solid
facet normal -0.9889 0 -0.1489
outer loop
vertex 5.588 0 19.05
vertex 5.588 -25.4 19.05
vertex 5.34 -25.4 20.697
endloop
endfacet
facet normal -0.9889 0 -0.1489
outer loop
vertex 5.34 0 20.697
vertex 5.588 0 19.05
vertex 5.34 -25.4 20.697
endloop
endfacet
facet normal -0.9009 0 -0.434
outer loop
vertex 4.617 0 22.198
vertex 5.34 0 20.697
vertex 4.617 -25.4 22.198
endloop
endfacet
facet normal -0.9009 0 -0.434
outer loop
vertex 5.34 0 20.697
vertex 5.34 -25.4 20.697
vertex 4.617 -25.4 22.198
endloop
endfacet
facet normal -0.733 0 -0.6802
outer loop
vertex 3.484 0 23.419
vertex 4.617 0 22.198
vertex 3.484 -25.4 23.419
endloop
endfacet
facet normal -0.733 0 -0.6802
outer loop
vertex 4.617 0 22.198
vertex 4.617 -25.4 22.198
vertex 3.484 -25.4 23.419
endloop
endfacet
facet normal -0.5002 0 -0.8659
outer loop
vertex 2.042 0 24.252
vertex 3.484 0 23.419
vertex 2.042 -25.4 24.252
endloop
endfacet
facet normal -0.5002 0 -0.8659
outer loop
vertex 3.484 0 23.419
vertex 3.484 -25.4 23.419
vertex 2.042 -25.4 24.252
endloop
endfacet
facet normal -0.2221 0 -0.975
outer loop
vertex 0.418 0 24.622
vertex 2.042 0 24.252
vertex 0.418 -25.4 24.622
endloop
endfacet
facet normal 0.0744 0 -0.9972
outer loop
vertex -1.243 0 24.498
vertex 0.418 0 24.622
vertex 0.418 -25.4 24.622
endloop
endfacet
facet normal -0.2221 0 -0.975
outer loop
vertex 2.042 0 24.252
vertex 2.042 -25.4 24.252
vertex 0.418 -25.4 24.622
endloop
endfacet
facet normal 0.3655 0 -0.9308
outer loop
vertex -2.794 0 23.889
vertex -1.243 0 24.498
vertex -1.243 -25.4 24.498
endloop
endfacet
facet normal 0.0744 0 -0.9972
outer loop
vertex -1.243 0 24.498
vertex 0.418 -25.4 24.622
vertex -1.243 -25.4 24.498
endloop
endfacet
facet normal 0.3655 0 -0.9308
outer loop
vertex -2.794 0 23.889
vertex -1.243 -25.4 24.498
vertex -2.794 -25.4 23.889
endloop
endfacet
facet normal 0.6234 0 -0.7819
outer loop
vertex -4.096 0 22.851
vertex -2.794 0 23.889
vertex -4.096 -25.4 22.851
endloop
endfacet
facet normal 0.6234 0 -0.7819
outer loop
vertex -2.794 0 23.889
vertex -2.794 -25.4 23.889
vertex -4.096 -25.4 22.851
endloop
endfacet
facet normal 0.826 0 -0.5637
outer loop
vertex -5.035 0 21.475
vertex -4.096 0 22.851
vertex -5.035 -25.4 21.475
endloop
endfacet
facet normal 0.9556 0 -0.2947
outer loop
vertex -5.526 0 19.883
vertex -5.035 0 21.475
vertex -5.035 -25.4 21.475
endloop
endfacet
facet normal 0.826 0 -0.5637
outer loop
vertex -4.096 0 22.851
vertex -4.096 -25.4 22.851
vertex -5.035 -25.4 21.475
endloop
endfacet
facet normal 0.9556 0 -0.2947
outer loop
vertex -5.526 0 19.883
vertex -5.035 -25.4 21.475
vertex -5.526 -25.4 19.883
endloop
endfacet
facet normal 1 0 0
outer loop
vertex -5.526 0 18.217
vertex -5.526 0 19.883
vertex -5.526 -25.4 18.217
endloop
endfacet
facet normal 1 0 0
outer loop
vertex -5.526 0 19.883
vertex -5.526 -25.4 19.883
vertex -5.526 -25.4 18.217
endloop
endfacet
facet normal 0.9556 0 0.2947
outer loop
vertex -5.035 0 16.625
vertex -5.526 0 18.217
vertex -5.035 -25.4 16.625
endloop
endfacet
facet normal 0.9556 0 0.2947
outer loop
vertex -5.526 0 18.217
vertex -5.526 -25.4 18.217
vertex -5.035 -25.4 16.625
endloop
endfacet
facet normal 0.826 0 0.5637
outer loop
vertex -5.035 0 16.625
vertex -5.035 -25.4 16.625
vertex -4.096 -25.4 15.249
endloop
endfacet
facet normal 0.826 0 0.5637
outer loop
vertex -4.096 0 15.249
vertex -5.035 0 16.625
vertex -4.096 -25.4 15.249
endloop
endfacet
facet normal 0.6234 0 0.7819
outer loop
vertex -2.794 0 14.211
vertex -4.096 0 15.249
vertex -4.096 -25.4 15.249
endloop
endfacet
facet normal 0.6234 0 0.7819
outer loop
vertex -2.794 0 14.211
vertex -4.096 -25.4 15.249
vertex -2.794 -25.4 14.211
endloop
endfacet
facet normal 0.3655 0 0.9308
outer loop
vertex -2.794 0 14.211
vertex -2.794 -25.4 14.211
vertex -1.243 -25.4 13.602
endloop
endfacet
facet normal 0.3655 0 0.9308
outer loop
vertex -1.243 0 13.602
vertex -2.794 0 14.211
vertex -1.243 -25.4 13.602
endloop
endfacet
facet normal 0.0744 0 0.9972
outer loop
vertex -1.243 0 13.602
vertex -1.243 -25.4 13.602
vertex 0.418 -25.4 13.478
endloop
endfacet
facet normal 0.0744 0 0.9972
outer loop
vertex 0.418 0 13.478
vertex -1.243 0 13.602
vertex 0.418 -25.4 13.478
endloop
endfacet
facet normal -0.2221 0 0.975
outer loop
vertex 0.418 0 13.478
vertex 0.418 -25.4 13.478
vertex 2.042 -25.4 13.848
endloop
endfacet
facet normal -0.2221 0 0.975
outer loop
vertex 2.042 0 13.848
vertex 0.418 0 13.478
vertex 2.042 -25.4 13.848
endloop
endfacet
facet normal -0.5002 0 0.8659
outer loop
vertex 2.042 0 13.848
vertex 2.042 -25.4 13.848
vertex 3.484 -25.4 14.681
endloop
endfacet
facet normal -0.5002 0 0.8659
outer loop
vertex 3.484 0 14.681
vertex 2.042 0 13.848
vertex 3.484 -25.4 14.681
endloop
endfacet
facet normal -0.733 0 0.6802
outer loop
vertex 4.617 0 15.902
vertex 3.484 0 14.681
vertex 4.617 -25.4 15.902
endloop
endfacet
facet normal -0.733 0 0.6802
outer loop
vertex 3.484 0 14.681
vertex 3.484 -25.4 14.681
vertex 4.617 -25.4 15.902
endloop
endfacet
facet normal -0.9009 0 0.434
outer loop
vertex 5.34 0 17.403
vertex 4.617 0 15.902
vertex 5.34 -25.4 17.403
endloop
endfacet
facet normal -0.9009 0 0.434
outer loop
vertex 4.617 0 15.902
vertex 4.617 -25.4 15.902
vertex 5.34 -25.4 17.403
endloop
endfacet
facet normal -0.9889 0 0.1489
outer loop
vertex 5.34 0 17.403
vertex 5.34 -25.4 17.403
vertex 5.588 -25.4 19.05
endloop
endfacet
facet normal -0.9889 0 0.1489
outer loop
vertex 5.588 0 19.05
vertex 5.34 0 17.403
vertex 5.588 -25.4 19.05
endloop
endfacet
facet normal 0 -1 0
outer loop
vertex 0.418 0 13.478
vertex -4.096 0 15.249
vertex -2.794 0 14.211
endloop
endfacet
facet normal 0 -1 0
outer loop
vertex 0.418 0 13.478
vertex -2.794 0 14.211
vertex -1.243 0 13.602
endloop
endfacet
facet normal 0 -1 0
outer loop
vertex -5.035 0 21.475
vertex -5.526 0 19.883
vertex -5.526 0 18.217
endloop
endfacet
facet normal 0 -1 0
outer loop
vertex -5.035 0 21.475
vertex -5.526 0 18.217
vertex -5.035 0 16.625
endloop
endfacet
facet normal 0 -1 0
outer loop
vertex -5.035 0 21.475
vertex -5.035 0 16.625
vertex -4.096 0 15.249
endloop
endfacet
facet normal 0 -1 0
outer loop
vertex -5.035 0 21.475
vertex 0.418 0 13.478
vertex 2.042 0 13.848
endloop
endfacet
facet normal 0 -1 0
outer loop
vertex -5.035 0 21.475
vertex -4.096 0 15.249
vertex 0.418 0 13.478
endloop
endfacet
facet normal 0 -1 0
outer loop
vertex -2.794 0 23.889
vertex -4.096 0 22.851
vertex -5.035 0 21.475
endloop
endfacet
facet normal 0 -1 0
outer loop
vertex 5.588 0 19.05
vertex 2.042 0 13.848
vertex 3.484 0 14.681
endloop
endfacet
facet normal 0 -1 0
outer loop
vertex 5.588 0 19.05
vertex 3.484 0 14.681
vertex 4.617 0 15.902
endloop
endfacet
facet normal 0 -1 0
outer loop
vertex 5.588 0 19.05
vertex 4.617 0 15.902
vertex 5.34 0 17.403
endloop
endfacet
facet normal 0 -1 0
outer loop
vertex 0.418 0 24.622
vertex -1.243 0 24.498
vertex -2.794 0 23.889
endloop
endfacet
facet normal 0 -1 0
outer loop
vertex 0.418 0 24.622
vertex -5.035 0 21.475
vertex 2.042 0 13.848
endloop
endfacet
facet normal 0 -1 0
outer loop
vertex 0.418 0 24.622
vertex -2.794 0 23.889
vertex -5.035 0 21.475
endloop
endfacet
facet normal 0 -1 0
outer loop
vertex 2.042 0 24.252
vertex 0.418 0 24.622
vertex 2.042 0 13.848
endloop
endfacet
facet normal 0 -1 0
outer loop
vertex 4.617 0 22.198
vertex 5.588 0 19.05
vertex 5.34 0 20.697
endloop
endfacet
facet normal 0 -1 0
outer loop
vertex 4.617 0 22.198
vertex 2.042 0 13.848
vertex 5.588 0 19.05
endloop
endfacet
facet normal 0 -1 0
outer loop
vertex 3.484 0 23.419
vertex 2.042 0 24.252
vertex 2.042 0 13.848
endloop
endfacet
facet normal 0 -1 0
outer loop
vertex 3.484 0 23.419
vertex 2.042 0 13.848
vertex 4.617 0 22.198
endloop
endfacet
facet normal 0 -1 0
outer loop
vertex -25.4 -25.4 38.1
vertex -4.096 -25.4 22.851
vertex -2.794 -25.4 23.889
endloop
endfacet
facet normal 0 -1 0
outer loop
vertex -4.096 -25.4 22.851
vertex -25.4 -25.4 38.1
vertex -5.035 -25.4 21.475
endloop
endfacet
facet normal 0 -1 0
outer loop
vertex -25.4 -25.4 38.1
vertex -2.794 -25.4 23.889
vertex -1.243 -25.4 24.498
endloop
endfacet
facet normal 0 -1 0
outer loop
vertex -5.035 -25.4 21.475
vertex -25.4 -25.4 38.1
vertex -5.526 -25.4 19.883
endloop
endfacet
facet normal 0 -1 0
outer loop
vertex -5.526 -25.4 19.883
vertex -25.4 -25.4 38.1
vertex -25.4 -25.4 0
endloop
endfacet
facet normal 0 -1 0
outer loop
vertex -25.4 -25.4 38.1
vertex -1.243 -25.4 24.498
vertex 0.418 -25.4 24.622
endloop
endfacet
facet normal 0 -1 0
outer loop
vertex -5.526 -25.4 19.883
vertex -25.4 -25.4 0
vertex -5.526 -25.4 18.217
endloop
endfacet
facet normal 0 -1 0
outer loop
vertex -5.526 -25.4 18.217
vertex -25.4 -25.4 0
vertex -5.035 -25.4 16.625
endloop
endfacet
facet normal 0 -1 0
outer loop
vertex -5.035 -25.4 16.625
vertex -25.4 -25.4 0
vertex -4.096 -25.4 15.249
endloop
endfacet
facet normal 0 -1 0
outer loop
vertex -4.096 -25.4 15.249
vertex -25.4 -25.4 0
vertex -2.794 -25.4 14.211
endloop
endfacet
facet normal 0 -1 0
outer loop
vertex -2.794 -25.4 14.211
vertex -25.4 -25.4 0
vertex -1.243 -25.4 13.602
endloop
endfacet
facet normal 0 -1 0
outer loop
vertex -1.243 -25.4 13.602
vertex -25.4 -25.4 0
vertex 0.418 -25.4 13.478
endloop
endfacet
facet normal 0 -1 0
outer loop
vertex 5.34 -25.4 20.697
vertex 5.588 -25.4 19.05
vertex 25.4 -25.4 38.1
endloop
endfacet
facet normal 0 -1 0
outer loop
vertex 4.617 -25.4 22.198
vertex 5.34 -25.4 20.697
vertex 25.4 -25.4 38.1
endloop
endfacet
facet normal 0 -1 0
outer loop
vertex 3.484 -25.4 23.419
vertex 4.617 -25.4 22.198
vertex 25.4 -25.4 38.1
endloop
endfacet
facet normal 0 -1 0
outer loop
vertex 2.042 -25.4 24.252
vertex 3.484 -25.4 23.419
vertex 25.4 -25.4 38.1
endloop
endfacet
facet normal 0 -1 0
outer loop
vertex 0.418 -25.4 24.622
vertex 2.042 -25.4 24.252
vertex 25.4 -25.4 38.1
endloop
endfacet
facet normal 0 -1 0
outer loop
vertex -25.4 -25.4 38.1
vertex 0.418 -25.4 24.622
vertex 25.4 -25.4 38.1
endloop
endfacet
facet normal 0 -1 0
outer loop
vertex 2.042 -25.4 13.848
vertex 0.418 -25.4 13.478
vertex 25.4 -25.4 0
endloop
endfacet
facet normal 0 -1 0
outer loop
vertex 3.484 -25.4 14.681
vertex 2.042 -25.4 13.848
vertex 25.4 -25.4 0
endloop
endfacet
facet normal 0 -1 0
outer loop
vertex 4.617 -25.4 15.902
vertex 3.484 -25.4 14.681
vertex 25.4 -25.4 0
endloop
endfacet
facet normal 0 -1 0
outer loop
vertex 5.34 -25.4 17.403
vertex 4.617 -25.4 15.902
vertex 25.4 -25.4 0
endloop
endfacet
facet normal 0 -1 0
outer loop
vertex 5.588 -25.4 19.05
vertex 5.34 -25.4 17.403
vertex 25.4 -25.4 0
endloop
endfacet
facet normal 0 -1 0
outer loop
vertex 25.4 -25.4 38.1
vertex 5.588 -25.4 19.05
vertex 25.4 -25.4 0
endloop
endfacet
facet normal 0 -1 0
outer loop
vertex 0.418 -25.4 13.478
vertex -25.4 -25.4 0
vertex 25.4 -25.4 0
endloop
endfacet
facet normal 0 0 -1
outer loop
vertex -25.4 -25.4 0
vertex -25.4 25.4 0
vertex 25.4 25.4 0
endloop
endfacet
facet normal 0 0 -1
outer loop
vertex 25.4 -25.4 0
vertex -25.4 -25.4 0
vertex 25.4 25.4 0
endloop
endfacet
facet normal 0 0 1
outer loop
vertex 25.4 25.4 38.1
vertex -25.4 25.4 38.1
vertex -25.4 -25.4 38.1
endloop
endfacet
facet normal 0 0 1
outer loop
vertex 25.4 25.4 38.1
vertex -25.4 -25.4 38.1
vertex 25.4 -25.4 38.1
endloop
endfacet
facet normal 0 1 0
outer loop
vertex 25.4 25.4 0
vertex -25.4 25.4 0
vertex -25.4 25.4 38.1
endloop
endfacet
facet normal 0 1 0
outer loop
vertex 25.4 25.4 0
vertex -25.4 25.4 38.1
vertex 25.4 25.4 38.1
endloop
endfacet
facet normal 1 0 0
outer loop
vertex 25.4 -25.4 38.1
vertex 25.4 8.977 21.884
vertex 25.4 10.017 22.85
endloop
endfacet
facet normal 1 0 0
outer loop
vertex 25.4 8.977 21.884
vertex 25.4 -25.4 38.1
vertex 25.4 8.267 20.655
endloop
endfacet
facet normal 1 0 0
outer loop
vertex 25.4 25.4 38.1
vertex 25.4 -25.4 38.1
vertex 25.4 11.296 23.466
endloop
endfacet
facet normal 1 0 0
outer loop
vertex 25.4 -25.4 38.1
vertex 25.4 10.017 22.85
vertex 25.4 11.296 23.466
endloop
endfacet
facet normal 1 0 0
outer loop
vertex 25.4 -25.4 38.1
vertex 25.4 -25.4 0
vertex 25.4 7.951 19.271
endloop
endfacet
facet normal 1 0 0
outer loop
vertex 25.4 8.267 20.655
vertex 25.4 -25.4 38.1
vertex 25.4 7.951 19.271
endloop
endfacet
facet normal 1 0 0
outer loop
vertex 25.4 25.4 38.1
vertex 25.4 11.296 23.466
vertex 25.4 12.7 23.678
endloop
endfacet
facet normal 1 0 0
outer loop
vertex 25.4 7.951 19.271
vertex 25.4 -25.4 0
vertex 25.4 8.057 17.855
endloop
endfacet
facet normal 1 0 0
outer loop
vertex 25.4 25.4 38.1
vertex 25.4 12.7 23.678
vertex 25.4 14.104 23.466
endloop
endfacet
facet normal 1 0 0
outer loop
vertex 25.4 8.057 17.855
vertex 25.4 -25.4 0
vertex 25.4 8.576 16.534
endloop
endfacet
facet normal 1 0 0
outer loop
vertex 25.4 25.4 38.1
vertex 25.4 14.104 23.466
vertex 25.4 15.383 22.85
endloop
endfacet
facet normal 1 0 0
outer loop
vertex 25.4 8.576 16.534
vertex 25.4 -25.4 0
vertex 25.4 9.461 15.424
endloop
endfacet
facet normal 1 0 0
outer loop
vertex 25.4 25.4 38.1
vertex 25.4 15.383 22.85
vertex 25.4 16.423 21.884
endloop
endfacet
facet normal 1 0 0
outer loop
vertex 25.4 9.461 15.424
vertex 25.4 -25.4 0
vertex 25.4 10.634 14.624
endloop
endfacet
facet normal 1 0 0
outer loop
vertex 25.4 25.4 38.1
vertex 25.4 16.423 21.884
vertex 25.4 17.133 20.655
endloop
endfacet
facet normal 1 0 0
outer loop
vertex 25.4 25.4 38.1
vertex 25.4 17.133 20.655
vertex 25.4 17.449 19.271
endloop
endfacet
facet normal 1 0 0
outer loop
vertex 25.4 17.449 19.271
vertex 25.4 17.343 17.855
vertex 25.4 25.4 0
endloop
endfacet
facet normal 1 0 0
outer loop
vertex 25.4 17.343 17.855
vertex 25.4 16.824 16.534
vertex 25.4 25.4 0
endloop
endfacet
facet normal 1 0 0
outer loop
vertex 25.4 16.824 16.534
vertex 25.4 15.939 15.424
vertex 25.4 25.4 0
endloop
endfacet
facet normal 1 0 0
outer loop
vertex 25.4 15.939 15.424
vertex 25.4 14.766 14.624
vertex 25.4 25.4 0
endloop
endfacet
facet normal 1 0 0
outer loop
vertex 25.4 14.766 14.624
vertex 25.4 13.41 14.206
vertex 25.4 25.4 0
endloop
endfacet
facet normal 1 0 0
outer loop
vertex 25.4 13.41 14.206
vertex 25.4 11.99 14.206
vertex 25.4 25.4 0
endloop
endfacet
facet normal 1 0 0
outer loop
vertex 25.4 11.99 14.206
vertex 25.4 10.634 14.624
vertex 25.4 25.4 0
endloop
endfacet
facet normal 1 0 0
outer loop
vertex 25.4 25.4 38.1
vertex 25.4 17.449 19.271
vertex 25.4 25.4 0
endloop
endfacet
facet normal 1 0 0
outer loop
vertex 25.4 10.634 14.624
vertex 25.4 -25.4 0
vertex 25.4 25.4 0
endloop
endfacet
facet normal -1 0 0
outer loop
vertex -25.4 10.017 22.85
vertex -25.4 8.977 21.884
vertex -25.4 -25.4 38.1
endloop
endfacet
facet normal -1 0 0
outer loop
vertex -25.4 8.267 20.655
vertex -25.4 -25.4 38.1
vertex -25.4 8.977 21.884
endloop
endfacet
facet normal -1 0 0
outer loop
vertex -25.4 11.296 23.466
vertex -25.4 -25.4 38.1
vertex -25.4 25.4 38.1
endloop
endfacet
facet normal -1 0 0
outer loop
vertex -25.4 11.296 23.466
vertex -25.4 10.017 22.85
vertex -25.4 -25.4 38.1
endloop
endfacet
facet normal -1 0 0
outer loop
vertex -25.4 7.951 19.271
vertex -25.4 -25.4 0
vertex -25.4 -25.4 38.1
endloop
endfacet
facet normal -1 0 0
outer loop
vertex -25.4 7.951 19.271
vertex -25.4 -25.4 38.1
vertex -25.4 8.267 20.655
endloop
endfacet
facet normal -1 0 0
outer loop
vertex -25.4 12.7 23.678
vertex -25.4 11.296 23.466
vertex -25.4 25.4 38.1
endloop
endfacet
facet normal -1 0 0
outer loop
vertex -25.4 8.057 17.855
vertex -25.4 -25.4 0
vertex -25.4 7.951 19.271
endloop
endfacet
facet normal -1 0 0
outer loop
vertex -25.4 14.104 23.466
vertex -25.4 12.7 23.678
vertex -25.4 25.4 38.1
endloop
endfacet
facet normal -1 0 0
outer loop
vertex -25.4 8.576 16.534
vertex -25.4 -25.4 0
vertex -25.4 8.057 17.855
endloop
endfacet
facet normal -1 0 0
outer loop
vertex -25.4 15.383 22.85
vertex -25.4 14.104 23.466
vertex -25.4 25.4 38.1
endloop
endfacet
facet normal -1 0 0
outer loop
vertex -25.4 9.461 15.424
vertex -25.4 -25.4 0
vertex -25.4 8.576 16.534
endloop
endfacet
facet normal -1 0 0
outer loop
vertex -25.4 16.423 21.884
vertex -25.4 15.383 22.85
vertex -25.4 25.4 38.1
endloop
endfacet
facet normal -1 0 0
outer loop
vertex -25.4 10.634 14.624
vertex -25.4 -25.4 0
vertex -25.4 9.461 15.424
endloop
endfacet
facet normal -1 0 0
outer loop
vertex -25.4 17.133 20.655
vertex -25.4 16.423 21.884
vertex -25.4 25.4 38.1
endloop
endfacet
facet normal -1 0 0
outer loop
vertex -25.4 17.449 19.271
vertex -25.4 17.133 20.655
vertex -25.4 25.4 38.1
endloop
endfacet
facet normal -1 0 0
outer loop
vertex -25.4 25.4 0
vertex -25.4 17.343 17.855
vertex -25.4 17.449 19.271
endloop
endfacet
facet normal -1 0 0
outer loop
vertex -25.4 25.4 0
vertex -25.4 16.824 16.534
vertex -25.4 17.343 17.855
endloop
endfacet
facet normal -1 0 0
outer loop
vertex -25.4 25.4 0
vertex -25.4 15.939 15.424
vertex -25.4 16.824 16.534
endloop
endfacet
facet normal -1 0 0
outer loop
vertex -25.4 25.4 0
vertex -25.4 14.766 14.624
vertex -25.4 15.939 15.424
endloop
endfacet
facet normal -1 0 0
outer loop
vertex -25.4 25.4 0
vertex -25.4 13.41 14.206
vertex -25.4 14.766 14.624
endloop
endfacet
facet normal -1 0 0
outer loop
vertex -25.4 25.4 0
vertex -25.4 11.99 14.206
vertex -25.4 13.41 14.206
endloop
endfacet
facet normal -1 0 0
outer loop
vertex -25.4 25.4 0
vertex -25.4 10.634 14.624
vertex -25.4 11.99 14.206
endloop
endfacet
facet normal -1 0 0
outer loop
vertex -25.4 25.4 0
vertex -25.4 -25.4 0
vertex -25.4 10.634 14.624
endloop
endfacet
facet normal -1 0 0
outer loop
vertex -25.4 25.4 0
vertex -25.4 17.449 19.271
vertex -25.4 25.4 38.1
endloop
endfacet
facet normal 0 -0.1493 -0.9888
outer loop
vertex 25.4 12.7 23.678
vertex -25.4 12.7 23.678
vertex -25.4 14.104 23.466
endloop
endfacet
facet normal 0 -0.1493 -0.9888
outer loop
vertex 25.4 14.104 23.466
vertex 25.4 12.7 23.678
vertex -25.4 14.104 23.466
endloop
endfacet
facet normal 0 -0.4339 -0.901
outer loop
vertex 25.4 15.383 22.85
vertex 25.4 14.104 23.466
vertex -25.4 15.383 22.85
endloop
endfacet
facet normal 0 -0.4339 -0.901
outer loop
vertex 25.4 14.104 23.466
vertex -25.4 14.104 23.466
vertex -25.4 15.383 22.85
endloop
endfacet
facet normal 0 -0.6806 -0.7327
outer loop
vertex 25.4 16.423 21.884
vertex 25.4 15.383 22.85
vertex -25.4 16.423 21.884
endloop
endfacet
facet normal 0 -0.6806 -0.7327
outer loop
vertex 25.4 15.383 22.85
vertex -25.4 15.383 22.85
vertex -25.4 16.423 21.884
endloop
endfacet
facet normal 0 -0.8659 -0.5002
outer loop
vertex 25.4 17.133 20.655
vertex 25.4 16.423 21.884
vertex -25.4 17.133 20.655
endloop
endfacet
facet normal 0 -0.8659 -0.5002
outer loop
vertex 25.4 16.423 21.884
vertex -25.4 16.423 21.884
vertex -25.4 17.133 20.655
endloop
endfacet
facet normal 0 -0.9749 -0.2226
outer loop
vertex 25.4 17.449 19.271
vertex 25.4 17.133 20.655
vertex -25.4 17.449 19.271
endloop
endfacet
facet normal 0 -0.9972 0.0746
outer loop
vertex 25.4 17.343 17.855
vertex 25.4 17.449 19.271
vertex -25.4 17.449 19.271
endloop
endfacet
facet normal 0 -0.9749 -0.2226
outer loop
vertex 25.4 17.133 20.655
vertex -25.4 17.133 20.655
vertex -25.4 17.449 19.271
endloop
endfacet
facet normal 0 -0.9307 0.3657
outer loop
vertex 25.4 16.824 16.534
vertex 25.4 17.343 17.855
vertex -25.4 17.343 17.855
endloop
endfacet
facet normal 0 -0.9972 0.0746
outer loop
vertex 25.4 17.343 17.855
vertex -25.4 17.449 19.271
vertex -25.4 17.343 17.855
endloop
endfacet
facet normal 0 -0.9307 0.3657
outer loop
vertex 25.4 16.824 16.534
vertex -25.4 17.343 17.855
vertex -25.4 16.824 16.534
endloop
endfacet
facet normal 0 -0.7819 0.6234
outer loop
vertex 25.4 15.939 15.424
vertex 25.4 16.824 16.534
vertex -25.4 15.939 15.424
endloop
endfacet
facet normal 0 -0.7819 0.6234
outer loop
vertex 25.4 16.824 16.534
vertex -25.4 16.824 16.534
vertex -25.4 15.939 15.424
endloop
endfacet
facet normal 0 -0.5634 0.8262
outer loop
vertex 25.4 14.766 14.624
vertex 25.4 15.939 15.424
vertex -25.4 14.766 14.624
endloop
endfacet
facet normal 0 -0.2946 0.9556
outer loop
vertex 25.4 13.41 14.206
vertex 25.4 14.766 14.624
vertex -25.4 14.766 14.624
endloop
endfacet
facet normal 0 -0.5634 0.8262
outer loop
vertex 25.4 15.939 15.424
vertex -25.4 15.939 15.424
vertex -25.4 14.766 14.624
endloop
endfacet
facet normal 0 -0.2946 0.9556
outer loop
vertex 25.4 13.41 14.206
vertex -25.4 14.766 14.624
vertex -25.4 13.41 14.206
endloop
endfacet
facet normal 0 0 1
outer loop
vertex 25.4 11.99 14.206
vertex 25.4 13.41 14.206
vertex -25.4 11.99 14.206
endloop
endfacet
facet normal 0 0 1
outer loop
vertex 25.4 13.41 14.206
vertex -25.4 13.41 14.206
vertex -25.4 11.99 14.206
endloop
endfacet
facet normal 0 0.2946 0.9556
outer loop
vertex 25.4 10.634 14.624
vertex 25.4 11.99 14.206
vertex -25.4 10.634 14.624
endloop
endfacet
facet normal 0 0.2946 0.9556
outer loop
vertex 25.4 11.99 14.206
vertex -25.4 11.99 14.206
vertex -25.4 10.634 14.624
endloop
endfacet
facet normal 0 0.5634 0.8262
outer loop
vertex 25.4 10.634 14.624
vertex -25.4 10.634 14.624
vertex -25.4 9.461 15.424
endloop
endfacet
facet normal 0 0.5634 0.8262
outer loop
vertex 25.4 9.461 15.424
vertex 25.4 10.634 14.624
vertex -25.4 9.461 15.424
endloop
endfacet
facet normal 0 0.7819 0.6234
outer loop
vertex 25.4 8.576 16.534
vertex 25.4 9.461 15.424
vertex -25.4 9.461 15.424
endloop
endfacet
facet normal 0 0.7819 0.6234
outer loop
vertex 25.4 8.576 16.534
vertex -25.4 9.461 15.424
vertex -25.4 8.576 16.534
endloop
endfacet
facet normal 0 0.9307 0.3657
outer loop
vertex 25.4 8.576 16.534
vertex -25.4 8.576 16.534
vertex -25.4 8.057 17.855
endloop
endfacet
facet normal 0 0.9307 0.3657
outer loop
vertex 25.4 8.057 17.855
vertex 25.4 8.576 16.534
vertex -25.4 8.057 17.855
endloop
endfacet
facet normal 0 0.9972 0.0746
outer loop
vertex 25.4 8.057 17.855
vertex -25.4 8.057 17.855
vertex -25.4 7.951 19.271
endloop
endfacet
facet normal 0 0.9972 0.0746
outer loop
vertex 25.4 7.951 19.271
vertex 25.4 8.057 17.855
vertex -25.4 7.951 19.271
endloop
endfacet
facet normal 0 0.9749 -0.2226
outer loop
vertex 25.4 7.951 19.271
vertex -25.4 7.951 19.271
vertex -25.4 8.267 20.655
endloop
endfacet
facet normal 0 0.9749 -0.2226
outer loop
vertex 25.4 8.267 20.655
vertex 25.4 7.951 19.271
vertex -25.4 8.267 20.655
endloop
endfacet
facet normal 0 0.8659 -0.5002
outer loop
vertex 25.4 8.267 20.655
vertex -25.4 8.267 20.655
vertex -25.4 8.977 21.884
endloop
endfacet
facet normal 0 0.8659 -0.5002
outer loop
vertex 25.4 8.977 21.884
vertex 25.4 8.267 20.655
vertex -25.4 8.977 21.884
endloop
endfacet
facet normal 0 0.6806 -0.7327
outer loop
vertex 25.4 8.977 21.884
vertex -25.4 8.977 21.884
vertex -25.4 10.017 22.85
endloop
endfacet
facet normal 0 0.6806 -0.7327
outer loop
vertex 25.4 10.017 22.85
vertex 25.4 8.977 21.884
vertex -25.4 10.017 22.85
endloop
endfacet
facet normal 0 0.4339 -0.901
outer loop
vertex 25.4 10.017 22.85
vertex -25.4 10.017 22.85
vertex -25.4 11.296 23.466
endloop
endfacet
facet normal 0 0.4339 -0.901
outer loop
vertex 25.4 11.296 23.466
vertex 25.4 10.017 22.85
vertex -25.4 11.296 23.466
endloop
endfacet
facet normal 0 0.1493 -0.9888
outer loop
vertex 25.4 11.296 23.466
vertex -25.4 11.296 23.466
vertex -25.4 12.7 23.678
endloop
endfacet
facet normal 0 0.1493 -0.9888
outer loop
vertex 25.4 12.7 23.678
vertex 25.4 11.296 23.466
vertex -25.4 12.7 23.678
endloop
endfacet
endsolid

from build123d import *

# Parameters (mm, degrees)
SKETCH1_W           = 50.8
SKETCH1_H           = 50.8
BOSS_EXTRUDE1_DEPTH = 38.1
SKETCH3_R           = 5.588
CUT_EXTRUDE1_DEPTH  = 25.4
SKETCH4_R           = 4.7625
CUT_EXTRUDE2_DEPTH  = 51.8


with BuildPart() as part:
    # Sketch1 → Boss-Extrude1 (new body)
    with BuildSketch(Plane.XY):
        Rectangle(SKETCH1_W, SKETCH1_H)
    extrude(amount=BOSS_EXTRUDE1_DEPTH)

    # Sketch3 → Cut-Extrude1 (cut)
    with BuildSketch(Plane.XZ.offset(25.4)):
        with Locations((0, 19.05)):
            Circle(SKETCH3_R)
    extrude(amount=-CUT_EXTRUDE1_DEPTH, mode=Mode.SUBTRACT)

    # Sketch4 → Cut-Extrude2 (cut, through all)
    with BuildSketch(Plane.ZY.offset(25.4)):
        with Locations((18.915028582, 12.7)):
            Circle(SKETCH4_R)
    extrude(amount=-CUT_EXTRUDE2_DEPTH, mode=Mode.SUBTRACT)


solid = part.part
